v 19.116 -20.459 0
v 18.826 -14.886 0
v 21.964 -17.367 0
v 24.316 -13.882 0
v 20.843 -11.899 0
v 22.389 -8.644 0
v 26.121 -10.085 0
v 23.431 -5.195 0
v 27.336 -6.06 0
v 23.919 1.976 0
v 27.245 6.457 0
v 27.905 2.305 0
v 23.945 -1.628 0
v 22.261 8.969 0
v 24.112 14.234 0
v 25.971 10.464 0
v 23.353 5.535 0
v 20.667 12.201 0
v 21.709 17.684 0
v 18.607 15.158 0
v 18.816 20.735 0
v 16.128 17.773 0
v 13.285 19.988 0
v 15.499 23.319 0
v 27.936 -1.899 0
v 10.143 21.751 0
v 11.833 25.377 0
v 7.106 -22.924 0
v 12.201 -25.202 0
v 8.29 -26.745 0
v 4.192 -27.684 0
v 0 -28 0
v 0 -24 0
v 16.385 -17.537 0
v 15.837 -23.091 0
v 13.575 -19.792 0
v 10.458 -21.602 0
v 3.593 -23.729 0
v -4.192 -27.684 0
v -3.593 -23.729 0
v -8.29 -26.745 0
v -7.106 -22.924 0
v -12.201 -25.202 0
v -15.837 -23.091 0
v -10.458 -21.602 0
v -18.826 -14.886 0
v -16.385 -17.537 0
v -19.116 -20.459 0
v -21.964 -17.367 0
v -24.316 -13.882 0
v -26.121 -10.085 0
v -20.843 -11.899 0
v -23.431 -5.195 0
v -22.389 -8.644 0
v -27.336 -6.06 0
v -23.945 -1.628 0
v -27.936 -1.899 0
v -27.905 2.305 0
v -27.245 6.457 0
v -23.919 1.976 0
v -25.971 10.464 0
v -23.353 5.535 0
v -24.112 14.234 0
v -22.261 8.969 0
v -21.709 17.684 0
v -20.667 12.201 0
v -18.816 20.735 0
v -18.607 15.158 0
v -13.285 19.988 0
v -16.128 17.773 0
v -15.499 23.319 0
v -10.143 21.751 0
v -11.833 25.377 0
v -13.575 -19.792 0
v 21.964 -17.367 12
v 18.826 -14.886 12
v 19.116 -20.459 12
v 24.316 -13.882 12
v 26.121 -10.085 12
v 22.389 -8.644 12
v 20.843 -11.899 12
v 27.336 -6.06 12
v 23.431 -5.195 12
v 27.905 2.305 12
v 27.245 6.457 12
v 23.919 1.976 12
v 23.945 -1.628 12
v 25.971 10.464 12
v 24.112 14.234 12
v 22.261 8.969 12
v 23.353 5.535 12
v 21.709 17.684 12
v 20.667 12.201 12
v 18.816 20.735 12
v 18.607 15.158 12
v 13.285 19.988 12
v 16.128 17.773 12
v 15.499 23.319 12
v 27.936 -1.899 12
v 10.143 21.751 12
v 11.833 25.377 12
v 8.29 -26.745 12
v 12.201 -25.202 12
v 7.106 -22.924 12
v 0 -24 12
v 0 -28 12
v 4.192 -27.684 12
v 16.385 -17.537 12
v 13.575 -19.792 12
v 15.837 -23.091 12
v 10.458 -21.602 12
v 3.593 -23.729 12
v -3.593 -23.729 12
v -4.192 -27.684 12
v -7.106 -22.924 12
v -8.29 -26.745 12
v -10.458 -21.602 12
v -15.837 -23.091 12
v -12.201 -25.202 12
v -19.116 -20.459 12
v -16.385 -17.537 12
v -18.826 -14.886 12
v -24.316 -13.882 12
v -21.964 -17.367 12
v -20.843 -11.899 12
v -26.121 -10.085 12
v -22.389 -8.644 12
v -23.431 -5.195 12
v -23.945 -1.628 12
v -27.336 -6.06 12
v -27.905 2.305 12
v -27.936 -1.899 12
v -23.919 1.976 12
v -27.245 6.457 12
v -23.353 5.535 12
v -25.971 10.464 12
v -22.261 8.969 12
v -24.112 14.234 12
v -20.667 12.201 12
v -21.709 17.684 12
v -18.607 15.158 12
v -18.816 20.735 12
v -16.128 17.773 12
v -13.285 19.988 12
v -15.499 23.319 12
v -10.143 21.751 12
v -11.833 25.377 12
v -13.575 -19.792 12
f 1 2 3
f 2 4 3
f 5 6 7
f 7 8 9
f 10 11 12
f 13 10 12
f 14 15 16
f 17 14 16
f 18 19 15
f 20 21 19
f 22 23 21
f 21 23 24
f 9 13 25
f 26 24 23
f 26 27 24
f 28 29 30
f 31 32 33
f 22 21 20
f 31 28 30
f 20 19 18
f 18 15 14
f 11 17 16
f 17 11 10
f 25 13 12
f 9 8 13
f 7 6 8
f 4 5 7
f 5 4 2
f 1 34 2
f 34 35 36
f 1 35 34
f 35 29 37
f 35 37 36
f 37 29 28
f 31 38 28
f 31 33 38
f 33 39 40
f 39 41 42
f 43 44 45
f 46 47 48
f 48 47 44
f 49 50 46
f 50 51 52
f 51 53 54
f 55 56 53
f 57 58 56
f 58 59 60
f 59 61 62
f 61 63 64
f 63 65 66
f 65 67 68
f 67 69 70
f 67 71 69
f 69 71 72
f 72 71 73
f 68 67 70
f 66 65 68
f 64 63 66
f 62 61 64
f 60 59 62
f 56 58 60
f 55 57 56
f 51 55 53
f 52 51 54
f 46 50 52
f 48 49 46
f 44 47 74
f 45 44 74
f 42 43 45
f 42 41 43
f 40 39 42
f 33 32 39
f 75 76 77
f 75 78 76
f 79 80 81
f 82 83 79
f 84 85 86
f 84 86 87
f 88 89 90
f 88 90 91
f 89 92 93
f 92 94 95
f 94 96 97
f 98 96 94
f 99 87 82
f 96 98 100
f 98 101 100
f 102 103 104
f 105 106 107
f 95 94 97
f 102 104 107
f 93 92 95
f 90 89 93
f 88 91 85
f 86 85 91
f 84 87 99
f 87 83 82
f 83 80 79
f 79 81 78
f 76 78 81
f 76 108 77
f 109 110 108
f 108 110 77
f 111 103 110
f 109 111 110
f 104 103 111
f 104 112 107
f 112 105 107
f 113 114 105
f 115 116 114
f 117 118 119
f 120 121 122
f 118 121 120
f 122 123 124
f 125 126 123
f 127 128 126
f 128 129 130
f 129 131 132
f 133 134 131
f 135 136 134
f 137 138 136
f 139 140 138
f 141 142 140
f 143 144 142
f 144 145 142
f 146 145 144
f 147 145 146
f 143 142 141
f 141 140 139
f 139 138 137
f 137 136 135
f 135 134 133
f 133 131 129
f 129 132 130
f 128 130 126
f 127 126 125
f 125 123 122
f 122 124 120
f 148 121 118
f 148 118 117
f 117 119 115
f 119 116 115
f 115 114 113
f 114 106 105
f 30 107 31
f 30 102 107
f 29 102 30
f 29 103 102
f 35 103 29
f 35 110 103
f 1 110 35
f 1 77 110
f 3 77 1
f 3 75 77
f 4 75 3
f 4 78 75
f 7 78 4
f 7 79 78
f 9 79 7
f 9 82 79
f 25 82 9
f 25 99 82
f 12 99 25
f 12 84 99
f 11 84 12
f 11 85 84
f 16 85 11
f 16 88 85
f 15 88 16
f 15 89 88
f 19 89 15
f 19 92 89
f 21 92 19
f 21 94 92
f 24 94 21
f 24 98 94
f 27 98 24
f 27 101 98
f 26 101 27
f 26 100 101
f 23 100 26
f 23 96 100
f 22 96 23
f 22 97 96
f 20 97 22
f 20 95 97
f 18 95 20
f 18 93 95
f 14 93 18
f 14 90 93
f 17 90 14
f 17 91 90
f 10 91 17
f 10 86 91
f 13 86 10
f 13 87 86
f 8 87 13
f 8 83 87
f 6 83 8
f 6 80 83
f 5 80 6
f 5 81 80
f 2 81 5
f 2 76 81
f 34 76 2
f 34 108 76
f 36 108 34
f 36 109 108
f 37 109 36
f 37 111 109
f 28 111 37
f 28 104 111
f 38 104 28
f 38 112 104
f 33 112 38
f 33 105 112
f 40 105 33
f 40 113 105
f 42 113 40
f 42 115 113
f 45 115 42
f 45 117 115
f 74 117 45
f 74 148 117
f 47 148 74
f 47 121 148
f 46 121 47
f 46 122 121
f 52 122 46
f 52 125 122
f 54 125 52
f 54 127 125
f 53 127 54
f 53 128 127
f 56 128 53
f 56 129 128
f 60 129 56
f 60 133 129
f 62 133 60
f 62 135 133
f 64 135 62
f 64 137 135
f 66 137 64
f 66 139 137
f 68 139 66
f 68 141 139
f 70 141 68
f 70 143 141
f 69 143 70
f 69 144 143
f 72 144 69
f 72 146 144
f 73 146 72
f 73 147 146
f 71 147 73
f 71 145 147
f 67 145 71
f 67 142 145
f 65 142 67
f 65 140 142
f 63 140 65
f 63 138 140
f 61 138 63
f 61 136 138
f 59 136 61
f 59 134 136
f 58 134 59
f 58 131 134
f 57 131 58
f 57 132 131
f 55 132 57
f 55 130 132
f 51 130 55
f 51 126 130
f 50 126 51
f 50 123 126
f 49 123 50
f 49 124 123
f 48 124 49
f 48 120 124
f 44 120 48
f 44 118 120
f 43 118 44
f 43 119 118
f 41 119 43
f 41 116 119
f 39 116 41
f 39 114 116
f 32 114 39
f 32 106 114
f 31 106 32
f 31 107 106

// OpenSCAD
$fn = 32;

// ----------------------------------------------------------------------
// Spring clip: 56 mm outside, 4 mm band, 50 degree opening
// ----------------------------------------------------------------------

// --- parameters (mm) ---
outer_r = 28;             // clip outside radius
inner_r = 24;             // clip bore radius
band = 4;                 // band thickness
clip_w = 12;              // clip width
opening = 50;             // opening angle

clip_profile = [[-11.833, 25.377], [-15.499, 23.319], [-18.816, 20.735], [-21.709, 17.684], [-24.112, 14.234], [-25.971, 10.464], [-27.245, 6.457], [-27.905, 2.305], [-27.936, -1.899], [-27.336, -6.06], [-26.121, -10.085], [-24.316, -13.882], [-21.964, -17.367], [-19.116, -20.459], [-15.837, -23.091], [-12.201, -25.202], [-8.29, -26.745], [-4.192, -27.684], [0, -28], [4.192, -27.684], [8.29, -26.745], [12.201, -25.202], [15.837, -23.091], [19.116, -20.459], [21.964, -17.367], [24.316, -13.882], [26.121, -10.085], [27.336, -6.06], [27.936, -1.899], [27.905, 2.305], [27.245, 6.457], [25.971, 10.464], [24.112, 14.234], [21.709, 17.684], [18.816, 20.735], [15.499, 23.319], [11.833, 25.377], [10.143, 21.751], [13.285, 19.988], [16.128, 17.773], [18.607, 15.158], [20.667, 12.201], [22.261, 8.969], [23.353, 5.535], [23.919, 1.976], [23.945, -1.628], [23.431, -5.195], [22.389, -8.644], [20.843, -11.899], [18.826, -14.886], [16.385, -17.537], [13.575, -19.792], [10.458, -21.602], [7.106, -22.924], [3.593, -23.729], [0, -24], [-3.593, -23.729], [-7.106, -22.924], [-10.458, -21.602], [-13.575, -19.792], [-16.385, -17.537], [-18.826, -14.886], [-20.843, -11.899], [-22.389, -8.644], [-23.431, -5.195], [-23.945, -1.628], [-23.919, 1.976], [-23.353, 5.535], [-22.261, 8.969], [-20.667, 12.201], [-18.607, 15.158], [-16.128, 17.773], [-13.285, 19.988], [-10.143, 21.751]];

difference() {
  union() {
    linear_extrude(height = clip_w) polygon(clip_profile);
  }
}
